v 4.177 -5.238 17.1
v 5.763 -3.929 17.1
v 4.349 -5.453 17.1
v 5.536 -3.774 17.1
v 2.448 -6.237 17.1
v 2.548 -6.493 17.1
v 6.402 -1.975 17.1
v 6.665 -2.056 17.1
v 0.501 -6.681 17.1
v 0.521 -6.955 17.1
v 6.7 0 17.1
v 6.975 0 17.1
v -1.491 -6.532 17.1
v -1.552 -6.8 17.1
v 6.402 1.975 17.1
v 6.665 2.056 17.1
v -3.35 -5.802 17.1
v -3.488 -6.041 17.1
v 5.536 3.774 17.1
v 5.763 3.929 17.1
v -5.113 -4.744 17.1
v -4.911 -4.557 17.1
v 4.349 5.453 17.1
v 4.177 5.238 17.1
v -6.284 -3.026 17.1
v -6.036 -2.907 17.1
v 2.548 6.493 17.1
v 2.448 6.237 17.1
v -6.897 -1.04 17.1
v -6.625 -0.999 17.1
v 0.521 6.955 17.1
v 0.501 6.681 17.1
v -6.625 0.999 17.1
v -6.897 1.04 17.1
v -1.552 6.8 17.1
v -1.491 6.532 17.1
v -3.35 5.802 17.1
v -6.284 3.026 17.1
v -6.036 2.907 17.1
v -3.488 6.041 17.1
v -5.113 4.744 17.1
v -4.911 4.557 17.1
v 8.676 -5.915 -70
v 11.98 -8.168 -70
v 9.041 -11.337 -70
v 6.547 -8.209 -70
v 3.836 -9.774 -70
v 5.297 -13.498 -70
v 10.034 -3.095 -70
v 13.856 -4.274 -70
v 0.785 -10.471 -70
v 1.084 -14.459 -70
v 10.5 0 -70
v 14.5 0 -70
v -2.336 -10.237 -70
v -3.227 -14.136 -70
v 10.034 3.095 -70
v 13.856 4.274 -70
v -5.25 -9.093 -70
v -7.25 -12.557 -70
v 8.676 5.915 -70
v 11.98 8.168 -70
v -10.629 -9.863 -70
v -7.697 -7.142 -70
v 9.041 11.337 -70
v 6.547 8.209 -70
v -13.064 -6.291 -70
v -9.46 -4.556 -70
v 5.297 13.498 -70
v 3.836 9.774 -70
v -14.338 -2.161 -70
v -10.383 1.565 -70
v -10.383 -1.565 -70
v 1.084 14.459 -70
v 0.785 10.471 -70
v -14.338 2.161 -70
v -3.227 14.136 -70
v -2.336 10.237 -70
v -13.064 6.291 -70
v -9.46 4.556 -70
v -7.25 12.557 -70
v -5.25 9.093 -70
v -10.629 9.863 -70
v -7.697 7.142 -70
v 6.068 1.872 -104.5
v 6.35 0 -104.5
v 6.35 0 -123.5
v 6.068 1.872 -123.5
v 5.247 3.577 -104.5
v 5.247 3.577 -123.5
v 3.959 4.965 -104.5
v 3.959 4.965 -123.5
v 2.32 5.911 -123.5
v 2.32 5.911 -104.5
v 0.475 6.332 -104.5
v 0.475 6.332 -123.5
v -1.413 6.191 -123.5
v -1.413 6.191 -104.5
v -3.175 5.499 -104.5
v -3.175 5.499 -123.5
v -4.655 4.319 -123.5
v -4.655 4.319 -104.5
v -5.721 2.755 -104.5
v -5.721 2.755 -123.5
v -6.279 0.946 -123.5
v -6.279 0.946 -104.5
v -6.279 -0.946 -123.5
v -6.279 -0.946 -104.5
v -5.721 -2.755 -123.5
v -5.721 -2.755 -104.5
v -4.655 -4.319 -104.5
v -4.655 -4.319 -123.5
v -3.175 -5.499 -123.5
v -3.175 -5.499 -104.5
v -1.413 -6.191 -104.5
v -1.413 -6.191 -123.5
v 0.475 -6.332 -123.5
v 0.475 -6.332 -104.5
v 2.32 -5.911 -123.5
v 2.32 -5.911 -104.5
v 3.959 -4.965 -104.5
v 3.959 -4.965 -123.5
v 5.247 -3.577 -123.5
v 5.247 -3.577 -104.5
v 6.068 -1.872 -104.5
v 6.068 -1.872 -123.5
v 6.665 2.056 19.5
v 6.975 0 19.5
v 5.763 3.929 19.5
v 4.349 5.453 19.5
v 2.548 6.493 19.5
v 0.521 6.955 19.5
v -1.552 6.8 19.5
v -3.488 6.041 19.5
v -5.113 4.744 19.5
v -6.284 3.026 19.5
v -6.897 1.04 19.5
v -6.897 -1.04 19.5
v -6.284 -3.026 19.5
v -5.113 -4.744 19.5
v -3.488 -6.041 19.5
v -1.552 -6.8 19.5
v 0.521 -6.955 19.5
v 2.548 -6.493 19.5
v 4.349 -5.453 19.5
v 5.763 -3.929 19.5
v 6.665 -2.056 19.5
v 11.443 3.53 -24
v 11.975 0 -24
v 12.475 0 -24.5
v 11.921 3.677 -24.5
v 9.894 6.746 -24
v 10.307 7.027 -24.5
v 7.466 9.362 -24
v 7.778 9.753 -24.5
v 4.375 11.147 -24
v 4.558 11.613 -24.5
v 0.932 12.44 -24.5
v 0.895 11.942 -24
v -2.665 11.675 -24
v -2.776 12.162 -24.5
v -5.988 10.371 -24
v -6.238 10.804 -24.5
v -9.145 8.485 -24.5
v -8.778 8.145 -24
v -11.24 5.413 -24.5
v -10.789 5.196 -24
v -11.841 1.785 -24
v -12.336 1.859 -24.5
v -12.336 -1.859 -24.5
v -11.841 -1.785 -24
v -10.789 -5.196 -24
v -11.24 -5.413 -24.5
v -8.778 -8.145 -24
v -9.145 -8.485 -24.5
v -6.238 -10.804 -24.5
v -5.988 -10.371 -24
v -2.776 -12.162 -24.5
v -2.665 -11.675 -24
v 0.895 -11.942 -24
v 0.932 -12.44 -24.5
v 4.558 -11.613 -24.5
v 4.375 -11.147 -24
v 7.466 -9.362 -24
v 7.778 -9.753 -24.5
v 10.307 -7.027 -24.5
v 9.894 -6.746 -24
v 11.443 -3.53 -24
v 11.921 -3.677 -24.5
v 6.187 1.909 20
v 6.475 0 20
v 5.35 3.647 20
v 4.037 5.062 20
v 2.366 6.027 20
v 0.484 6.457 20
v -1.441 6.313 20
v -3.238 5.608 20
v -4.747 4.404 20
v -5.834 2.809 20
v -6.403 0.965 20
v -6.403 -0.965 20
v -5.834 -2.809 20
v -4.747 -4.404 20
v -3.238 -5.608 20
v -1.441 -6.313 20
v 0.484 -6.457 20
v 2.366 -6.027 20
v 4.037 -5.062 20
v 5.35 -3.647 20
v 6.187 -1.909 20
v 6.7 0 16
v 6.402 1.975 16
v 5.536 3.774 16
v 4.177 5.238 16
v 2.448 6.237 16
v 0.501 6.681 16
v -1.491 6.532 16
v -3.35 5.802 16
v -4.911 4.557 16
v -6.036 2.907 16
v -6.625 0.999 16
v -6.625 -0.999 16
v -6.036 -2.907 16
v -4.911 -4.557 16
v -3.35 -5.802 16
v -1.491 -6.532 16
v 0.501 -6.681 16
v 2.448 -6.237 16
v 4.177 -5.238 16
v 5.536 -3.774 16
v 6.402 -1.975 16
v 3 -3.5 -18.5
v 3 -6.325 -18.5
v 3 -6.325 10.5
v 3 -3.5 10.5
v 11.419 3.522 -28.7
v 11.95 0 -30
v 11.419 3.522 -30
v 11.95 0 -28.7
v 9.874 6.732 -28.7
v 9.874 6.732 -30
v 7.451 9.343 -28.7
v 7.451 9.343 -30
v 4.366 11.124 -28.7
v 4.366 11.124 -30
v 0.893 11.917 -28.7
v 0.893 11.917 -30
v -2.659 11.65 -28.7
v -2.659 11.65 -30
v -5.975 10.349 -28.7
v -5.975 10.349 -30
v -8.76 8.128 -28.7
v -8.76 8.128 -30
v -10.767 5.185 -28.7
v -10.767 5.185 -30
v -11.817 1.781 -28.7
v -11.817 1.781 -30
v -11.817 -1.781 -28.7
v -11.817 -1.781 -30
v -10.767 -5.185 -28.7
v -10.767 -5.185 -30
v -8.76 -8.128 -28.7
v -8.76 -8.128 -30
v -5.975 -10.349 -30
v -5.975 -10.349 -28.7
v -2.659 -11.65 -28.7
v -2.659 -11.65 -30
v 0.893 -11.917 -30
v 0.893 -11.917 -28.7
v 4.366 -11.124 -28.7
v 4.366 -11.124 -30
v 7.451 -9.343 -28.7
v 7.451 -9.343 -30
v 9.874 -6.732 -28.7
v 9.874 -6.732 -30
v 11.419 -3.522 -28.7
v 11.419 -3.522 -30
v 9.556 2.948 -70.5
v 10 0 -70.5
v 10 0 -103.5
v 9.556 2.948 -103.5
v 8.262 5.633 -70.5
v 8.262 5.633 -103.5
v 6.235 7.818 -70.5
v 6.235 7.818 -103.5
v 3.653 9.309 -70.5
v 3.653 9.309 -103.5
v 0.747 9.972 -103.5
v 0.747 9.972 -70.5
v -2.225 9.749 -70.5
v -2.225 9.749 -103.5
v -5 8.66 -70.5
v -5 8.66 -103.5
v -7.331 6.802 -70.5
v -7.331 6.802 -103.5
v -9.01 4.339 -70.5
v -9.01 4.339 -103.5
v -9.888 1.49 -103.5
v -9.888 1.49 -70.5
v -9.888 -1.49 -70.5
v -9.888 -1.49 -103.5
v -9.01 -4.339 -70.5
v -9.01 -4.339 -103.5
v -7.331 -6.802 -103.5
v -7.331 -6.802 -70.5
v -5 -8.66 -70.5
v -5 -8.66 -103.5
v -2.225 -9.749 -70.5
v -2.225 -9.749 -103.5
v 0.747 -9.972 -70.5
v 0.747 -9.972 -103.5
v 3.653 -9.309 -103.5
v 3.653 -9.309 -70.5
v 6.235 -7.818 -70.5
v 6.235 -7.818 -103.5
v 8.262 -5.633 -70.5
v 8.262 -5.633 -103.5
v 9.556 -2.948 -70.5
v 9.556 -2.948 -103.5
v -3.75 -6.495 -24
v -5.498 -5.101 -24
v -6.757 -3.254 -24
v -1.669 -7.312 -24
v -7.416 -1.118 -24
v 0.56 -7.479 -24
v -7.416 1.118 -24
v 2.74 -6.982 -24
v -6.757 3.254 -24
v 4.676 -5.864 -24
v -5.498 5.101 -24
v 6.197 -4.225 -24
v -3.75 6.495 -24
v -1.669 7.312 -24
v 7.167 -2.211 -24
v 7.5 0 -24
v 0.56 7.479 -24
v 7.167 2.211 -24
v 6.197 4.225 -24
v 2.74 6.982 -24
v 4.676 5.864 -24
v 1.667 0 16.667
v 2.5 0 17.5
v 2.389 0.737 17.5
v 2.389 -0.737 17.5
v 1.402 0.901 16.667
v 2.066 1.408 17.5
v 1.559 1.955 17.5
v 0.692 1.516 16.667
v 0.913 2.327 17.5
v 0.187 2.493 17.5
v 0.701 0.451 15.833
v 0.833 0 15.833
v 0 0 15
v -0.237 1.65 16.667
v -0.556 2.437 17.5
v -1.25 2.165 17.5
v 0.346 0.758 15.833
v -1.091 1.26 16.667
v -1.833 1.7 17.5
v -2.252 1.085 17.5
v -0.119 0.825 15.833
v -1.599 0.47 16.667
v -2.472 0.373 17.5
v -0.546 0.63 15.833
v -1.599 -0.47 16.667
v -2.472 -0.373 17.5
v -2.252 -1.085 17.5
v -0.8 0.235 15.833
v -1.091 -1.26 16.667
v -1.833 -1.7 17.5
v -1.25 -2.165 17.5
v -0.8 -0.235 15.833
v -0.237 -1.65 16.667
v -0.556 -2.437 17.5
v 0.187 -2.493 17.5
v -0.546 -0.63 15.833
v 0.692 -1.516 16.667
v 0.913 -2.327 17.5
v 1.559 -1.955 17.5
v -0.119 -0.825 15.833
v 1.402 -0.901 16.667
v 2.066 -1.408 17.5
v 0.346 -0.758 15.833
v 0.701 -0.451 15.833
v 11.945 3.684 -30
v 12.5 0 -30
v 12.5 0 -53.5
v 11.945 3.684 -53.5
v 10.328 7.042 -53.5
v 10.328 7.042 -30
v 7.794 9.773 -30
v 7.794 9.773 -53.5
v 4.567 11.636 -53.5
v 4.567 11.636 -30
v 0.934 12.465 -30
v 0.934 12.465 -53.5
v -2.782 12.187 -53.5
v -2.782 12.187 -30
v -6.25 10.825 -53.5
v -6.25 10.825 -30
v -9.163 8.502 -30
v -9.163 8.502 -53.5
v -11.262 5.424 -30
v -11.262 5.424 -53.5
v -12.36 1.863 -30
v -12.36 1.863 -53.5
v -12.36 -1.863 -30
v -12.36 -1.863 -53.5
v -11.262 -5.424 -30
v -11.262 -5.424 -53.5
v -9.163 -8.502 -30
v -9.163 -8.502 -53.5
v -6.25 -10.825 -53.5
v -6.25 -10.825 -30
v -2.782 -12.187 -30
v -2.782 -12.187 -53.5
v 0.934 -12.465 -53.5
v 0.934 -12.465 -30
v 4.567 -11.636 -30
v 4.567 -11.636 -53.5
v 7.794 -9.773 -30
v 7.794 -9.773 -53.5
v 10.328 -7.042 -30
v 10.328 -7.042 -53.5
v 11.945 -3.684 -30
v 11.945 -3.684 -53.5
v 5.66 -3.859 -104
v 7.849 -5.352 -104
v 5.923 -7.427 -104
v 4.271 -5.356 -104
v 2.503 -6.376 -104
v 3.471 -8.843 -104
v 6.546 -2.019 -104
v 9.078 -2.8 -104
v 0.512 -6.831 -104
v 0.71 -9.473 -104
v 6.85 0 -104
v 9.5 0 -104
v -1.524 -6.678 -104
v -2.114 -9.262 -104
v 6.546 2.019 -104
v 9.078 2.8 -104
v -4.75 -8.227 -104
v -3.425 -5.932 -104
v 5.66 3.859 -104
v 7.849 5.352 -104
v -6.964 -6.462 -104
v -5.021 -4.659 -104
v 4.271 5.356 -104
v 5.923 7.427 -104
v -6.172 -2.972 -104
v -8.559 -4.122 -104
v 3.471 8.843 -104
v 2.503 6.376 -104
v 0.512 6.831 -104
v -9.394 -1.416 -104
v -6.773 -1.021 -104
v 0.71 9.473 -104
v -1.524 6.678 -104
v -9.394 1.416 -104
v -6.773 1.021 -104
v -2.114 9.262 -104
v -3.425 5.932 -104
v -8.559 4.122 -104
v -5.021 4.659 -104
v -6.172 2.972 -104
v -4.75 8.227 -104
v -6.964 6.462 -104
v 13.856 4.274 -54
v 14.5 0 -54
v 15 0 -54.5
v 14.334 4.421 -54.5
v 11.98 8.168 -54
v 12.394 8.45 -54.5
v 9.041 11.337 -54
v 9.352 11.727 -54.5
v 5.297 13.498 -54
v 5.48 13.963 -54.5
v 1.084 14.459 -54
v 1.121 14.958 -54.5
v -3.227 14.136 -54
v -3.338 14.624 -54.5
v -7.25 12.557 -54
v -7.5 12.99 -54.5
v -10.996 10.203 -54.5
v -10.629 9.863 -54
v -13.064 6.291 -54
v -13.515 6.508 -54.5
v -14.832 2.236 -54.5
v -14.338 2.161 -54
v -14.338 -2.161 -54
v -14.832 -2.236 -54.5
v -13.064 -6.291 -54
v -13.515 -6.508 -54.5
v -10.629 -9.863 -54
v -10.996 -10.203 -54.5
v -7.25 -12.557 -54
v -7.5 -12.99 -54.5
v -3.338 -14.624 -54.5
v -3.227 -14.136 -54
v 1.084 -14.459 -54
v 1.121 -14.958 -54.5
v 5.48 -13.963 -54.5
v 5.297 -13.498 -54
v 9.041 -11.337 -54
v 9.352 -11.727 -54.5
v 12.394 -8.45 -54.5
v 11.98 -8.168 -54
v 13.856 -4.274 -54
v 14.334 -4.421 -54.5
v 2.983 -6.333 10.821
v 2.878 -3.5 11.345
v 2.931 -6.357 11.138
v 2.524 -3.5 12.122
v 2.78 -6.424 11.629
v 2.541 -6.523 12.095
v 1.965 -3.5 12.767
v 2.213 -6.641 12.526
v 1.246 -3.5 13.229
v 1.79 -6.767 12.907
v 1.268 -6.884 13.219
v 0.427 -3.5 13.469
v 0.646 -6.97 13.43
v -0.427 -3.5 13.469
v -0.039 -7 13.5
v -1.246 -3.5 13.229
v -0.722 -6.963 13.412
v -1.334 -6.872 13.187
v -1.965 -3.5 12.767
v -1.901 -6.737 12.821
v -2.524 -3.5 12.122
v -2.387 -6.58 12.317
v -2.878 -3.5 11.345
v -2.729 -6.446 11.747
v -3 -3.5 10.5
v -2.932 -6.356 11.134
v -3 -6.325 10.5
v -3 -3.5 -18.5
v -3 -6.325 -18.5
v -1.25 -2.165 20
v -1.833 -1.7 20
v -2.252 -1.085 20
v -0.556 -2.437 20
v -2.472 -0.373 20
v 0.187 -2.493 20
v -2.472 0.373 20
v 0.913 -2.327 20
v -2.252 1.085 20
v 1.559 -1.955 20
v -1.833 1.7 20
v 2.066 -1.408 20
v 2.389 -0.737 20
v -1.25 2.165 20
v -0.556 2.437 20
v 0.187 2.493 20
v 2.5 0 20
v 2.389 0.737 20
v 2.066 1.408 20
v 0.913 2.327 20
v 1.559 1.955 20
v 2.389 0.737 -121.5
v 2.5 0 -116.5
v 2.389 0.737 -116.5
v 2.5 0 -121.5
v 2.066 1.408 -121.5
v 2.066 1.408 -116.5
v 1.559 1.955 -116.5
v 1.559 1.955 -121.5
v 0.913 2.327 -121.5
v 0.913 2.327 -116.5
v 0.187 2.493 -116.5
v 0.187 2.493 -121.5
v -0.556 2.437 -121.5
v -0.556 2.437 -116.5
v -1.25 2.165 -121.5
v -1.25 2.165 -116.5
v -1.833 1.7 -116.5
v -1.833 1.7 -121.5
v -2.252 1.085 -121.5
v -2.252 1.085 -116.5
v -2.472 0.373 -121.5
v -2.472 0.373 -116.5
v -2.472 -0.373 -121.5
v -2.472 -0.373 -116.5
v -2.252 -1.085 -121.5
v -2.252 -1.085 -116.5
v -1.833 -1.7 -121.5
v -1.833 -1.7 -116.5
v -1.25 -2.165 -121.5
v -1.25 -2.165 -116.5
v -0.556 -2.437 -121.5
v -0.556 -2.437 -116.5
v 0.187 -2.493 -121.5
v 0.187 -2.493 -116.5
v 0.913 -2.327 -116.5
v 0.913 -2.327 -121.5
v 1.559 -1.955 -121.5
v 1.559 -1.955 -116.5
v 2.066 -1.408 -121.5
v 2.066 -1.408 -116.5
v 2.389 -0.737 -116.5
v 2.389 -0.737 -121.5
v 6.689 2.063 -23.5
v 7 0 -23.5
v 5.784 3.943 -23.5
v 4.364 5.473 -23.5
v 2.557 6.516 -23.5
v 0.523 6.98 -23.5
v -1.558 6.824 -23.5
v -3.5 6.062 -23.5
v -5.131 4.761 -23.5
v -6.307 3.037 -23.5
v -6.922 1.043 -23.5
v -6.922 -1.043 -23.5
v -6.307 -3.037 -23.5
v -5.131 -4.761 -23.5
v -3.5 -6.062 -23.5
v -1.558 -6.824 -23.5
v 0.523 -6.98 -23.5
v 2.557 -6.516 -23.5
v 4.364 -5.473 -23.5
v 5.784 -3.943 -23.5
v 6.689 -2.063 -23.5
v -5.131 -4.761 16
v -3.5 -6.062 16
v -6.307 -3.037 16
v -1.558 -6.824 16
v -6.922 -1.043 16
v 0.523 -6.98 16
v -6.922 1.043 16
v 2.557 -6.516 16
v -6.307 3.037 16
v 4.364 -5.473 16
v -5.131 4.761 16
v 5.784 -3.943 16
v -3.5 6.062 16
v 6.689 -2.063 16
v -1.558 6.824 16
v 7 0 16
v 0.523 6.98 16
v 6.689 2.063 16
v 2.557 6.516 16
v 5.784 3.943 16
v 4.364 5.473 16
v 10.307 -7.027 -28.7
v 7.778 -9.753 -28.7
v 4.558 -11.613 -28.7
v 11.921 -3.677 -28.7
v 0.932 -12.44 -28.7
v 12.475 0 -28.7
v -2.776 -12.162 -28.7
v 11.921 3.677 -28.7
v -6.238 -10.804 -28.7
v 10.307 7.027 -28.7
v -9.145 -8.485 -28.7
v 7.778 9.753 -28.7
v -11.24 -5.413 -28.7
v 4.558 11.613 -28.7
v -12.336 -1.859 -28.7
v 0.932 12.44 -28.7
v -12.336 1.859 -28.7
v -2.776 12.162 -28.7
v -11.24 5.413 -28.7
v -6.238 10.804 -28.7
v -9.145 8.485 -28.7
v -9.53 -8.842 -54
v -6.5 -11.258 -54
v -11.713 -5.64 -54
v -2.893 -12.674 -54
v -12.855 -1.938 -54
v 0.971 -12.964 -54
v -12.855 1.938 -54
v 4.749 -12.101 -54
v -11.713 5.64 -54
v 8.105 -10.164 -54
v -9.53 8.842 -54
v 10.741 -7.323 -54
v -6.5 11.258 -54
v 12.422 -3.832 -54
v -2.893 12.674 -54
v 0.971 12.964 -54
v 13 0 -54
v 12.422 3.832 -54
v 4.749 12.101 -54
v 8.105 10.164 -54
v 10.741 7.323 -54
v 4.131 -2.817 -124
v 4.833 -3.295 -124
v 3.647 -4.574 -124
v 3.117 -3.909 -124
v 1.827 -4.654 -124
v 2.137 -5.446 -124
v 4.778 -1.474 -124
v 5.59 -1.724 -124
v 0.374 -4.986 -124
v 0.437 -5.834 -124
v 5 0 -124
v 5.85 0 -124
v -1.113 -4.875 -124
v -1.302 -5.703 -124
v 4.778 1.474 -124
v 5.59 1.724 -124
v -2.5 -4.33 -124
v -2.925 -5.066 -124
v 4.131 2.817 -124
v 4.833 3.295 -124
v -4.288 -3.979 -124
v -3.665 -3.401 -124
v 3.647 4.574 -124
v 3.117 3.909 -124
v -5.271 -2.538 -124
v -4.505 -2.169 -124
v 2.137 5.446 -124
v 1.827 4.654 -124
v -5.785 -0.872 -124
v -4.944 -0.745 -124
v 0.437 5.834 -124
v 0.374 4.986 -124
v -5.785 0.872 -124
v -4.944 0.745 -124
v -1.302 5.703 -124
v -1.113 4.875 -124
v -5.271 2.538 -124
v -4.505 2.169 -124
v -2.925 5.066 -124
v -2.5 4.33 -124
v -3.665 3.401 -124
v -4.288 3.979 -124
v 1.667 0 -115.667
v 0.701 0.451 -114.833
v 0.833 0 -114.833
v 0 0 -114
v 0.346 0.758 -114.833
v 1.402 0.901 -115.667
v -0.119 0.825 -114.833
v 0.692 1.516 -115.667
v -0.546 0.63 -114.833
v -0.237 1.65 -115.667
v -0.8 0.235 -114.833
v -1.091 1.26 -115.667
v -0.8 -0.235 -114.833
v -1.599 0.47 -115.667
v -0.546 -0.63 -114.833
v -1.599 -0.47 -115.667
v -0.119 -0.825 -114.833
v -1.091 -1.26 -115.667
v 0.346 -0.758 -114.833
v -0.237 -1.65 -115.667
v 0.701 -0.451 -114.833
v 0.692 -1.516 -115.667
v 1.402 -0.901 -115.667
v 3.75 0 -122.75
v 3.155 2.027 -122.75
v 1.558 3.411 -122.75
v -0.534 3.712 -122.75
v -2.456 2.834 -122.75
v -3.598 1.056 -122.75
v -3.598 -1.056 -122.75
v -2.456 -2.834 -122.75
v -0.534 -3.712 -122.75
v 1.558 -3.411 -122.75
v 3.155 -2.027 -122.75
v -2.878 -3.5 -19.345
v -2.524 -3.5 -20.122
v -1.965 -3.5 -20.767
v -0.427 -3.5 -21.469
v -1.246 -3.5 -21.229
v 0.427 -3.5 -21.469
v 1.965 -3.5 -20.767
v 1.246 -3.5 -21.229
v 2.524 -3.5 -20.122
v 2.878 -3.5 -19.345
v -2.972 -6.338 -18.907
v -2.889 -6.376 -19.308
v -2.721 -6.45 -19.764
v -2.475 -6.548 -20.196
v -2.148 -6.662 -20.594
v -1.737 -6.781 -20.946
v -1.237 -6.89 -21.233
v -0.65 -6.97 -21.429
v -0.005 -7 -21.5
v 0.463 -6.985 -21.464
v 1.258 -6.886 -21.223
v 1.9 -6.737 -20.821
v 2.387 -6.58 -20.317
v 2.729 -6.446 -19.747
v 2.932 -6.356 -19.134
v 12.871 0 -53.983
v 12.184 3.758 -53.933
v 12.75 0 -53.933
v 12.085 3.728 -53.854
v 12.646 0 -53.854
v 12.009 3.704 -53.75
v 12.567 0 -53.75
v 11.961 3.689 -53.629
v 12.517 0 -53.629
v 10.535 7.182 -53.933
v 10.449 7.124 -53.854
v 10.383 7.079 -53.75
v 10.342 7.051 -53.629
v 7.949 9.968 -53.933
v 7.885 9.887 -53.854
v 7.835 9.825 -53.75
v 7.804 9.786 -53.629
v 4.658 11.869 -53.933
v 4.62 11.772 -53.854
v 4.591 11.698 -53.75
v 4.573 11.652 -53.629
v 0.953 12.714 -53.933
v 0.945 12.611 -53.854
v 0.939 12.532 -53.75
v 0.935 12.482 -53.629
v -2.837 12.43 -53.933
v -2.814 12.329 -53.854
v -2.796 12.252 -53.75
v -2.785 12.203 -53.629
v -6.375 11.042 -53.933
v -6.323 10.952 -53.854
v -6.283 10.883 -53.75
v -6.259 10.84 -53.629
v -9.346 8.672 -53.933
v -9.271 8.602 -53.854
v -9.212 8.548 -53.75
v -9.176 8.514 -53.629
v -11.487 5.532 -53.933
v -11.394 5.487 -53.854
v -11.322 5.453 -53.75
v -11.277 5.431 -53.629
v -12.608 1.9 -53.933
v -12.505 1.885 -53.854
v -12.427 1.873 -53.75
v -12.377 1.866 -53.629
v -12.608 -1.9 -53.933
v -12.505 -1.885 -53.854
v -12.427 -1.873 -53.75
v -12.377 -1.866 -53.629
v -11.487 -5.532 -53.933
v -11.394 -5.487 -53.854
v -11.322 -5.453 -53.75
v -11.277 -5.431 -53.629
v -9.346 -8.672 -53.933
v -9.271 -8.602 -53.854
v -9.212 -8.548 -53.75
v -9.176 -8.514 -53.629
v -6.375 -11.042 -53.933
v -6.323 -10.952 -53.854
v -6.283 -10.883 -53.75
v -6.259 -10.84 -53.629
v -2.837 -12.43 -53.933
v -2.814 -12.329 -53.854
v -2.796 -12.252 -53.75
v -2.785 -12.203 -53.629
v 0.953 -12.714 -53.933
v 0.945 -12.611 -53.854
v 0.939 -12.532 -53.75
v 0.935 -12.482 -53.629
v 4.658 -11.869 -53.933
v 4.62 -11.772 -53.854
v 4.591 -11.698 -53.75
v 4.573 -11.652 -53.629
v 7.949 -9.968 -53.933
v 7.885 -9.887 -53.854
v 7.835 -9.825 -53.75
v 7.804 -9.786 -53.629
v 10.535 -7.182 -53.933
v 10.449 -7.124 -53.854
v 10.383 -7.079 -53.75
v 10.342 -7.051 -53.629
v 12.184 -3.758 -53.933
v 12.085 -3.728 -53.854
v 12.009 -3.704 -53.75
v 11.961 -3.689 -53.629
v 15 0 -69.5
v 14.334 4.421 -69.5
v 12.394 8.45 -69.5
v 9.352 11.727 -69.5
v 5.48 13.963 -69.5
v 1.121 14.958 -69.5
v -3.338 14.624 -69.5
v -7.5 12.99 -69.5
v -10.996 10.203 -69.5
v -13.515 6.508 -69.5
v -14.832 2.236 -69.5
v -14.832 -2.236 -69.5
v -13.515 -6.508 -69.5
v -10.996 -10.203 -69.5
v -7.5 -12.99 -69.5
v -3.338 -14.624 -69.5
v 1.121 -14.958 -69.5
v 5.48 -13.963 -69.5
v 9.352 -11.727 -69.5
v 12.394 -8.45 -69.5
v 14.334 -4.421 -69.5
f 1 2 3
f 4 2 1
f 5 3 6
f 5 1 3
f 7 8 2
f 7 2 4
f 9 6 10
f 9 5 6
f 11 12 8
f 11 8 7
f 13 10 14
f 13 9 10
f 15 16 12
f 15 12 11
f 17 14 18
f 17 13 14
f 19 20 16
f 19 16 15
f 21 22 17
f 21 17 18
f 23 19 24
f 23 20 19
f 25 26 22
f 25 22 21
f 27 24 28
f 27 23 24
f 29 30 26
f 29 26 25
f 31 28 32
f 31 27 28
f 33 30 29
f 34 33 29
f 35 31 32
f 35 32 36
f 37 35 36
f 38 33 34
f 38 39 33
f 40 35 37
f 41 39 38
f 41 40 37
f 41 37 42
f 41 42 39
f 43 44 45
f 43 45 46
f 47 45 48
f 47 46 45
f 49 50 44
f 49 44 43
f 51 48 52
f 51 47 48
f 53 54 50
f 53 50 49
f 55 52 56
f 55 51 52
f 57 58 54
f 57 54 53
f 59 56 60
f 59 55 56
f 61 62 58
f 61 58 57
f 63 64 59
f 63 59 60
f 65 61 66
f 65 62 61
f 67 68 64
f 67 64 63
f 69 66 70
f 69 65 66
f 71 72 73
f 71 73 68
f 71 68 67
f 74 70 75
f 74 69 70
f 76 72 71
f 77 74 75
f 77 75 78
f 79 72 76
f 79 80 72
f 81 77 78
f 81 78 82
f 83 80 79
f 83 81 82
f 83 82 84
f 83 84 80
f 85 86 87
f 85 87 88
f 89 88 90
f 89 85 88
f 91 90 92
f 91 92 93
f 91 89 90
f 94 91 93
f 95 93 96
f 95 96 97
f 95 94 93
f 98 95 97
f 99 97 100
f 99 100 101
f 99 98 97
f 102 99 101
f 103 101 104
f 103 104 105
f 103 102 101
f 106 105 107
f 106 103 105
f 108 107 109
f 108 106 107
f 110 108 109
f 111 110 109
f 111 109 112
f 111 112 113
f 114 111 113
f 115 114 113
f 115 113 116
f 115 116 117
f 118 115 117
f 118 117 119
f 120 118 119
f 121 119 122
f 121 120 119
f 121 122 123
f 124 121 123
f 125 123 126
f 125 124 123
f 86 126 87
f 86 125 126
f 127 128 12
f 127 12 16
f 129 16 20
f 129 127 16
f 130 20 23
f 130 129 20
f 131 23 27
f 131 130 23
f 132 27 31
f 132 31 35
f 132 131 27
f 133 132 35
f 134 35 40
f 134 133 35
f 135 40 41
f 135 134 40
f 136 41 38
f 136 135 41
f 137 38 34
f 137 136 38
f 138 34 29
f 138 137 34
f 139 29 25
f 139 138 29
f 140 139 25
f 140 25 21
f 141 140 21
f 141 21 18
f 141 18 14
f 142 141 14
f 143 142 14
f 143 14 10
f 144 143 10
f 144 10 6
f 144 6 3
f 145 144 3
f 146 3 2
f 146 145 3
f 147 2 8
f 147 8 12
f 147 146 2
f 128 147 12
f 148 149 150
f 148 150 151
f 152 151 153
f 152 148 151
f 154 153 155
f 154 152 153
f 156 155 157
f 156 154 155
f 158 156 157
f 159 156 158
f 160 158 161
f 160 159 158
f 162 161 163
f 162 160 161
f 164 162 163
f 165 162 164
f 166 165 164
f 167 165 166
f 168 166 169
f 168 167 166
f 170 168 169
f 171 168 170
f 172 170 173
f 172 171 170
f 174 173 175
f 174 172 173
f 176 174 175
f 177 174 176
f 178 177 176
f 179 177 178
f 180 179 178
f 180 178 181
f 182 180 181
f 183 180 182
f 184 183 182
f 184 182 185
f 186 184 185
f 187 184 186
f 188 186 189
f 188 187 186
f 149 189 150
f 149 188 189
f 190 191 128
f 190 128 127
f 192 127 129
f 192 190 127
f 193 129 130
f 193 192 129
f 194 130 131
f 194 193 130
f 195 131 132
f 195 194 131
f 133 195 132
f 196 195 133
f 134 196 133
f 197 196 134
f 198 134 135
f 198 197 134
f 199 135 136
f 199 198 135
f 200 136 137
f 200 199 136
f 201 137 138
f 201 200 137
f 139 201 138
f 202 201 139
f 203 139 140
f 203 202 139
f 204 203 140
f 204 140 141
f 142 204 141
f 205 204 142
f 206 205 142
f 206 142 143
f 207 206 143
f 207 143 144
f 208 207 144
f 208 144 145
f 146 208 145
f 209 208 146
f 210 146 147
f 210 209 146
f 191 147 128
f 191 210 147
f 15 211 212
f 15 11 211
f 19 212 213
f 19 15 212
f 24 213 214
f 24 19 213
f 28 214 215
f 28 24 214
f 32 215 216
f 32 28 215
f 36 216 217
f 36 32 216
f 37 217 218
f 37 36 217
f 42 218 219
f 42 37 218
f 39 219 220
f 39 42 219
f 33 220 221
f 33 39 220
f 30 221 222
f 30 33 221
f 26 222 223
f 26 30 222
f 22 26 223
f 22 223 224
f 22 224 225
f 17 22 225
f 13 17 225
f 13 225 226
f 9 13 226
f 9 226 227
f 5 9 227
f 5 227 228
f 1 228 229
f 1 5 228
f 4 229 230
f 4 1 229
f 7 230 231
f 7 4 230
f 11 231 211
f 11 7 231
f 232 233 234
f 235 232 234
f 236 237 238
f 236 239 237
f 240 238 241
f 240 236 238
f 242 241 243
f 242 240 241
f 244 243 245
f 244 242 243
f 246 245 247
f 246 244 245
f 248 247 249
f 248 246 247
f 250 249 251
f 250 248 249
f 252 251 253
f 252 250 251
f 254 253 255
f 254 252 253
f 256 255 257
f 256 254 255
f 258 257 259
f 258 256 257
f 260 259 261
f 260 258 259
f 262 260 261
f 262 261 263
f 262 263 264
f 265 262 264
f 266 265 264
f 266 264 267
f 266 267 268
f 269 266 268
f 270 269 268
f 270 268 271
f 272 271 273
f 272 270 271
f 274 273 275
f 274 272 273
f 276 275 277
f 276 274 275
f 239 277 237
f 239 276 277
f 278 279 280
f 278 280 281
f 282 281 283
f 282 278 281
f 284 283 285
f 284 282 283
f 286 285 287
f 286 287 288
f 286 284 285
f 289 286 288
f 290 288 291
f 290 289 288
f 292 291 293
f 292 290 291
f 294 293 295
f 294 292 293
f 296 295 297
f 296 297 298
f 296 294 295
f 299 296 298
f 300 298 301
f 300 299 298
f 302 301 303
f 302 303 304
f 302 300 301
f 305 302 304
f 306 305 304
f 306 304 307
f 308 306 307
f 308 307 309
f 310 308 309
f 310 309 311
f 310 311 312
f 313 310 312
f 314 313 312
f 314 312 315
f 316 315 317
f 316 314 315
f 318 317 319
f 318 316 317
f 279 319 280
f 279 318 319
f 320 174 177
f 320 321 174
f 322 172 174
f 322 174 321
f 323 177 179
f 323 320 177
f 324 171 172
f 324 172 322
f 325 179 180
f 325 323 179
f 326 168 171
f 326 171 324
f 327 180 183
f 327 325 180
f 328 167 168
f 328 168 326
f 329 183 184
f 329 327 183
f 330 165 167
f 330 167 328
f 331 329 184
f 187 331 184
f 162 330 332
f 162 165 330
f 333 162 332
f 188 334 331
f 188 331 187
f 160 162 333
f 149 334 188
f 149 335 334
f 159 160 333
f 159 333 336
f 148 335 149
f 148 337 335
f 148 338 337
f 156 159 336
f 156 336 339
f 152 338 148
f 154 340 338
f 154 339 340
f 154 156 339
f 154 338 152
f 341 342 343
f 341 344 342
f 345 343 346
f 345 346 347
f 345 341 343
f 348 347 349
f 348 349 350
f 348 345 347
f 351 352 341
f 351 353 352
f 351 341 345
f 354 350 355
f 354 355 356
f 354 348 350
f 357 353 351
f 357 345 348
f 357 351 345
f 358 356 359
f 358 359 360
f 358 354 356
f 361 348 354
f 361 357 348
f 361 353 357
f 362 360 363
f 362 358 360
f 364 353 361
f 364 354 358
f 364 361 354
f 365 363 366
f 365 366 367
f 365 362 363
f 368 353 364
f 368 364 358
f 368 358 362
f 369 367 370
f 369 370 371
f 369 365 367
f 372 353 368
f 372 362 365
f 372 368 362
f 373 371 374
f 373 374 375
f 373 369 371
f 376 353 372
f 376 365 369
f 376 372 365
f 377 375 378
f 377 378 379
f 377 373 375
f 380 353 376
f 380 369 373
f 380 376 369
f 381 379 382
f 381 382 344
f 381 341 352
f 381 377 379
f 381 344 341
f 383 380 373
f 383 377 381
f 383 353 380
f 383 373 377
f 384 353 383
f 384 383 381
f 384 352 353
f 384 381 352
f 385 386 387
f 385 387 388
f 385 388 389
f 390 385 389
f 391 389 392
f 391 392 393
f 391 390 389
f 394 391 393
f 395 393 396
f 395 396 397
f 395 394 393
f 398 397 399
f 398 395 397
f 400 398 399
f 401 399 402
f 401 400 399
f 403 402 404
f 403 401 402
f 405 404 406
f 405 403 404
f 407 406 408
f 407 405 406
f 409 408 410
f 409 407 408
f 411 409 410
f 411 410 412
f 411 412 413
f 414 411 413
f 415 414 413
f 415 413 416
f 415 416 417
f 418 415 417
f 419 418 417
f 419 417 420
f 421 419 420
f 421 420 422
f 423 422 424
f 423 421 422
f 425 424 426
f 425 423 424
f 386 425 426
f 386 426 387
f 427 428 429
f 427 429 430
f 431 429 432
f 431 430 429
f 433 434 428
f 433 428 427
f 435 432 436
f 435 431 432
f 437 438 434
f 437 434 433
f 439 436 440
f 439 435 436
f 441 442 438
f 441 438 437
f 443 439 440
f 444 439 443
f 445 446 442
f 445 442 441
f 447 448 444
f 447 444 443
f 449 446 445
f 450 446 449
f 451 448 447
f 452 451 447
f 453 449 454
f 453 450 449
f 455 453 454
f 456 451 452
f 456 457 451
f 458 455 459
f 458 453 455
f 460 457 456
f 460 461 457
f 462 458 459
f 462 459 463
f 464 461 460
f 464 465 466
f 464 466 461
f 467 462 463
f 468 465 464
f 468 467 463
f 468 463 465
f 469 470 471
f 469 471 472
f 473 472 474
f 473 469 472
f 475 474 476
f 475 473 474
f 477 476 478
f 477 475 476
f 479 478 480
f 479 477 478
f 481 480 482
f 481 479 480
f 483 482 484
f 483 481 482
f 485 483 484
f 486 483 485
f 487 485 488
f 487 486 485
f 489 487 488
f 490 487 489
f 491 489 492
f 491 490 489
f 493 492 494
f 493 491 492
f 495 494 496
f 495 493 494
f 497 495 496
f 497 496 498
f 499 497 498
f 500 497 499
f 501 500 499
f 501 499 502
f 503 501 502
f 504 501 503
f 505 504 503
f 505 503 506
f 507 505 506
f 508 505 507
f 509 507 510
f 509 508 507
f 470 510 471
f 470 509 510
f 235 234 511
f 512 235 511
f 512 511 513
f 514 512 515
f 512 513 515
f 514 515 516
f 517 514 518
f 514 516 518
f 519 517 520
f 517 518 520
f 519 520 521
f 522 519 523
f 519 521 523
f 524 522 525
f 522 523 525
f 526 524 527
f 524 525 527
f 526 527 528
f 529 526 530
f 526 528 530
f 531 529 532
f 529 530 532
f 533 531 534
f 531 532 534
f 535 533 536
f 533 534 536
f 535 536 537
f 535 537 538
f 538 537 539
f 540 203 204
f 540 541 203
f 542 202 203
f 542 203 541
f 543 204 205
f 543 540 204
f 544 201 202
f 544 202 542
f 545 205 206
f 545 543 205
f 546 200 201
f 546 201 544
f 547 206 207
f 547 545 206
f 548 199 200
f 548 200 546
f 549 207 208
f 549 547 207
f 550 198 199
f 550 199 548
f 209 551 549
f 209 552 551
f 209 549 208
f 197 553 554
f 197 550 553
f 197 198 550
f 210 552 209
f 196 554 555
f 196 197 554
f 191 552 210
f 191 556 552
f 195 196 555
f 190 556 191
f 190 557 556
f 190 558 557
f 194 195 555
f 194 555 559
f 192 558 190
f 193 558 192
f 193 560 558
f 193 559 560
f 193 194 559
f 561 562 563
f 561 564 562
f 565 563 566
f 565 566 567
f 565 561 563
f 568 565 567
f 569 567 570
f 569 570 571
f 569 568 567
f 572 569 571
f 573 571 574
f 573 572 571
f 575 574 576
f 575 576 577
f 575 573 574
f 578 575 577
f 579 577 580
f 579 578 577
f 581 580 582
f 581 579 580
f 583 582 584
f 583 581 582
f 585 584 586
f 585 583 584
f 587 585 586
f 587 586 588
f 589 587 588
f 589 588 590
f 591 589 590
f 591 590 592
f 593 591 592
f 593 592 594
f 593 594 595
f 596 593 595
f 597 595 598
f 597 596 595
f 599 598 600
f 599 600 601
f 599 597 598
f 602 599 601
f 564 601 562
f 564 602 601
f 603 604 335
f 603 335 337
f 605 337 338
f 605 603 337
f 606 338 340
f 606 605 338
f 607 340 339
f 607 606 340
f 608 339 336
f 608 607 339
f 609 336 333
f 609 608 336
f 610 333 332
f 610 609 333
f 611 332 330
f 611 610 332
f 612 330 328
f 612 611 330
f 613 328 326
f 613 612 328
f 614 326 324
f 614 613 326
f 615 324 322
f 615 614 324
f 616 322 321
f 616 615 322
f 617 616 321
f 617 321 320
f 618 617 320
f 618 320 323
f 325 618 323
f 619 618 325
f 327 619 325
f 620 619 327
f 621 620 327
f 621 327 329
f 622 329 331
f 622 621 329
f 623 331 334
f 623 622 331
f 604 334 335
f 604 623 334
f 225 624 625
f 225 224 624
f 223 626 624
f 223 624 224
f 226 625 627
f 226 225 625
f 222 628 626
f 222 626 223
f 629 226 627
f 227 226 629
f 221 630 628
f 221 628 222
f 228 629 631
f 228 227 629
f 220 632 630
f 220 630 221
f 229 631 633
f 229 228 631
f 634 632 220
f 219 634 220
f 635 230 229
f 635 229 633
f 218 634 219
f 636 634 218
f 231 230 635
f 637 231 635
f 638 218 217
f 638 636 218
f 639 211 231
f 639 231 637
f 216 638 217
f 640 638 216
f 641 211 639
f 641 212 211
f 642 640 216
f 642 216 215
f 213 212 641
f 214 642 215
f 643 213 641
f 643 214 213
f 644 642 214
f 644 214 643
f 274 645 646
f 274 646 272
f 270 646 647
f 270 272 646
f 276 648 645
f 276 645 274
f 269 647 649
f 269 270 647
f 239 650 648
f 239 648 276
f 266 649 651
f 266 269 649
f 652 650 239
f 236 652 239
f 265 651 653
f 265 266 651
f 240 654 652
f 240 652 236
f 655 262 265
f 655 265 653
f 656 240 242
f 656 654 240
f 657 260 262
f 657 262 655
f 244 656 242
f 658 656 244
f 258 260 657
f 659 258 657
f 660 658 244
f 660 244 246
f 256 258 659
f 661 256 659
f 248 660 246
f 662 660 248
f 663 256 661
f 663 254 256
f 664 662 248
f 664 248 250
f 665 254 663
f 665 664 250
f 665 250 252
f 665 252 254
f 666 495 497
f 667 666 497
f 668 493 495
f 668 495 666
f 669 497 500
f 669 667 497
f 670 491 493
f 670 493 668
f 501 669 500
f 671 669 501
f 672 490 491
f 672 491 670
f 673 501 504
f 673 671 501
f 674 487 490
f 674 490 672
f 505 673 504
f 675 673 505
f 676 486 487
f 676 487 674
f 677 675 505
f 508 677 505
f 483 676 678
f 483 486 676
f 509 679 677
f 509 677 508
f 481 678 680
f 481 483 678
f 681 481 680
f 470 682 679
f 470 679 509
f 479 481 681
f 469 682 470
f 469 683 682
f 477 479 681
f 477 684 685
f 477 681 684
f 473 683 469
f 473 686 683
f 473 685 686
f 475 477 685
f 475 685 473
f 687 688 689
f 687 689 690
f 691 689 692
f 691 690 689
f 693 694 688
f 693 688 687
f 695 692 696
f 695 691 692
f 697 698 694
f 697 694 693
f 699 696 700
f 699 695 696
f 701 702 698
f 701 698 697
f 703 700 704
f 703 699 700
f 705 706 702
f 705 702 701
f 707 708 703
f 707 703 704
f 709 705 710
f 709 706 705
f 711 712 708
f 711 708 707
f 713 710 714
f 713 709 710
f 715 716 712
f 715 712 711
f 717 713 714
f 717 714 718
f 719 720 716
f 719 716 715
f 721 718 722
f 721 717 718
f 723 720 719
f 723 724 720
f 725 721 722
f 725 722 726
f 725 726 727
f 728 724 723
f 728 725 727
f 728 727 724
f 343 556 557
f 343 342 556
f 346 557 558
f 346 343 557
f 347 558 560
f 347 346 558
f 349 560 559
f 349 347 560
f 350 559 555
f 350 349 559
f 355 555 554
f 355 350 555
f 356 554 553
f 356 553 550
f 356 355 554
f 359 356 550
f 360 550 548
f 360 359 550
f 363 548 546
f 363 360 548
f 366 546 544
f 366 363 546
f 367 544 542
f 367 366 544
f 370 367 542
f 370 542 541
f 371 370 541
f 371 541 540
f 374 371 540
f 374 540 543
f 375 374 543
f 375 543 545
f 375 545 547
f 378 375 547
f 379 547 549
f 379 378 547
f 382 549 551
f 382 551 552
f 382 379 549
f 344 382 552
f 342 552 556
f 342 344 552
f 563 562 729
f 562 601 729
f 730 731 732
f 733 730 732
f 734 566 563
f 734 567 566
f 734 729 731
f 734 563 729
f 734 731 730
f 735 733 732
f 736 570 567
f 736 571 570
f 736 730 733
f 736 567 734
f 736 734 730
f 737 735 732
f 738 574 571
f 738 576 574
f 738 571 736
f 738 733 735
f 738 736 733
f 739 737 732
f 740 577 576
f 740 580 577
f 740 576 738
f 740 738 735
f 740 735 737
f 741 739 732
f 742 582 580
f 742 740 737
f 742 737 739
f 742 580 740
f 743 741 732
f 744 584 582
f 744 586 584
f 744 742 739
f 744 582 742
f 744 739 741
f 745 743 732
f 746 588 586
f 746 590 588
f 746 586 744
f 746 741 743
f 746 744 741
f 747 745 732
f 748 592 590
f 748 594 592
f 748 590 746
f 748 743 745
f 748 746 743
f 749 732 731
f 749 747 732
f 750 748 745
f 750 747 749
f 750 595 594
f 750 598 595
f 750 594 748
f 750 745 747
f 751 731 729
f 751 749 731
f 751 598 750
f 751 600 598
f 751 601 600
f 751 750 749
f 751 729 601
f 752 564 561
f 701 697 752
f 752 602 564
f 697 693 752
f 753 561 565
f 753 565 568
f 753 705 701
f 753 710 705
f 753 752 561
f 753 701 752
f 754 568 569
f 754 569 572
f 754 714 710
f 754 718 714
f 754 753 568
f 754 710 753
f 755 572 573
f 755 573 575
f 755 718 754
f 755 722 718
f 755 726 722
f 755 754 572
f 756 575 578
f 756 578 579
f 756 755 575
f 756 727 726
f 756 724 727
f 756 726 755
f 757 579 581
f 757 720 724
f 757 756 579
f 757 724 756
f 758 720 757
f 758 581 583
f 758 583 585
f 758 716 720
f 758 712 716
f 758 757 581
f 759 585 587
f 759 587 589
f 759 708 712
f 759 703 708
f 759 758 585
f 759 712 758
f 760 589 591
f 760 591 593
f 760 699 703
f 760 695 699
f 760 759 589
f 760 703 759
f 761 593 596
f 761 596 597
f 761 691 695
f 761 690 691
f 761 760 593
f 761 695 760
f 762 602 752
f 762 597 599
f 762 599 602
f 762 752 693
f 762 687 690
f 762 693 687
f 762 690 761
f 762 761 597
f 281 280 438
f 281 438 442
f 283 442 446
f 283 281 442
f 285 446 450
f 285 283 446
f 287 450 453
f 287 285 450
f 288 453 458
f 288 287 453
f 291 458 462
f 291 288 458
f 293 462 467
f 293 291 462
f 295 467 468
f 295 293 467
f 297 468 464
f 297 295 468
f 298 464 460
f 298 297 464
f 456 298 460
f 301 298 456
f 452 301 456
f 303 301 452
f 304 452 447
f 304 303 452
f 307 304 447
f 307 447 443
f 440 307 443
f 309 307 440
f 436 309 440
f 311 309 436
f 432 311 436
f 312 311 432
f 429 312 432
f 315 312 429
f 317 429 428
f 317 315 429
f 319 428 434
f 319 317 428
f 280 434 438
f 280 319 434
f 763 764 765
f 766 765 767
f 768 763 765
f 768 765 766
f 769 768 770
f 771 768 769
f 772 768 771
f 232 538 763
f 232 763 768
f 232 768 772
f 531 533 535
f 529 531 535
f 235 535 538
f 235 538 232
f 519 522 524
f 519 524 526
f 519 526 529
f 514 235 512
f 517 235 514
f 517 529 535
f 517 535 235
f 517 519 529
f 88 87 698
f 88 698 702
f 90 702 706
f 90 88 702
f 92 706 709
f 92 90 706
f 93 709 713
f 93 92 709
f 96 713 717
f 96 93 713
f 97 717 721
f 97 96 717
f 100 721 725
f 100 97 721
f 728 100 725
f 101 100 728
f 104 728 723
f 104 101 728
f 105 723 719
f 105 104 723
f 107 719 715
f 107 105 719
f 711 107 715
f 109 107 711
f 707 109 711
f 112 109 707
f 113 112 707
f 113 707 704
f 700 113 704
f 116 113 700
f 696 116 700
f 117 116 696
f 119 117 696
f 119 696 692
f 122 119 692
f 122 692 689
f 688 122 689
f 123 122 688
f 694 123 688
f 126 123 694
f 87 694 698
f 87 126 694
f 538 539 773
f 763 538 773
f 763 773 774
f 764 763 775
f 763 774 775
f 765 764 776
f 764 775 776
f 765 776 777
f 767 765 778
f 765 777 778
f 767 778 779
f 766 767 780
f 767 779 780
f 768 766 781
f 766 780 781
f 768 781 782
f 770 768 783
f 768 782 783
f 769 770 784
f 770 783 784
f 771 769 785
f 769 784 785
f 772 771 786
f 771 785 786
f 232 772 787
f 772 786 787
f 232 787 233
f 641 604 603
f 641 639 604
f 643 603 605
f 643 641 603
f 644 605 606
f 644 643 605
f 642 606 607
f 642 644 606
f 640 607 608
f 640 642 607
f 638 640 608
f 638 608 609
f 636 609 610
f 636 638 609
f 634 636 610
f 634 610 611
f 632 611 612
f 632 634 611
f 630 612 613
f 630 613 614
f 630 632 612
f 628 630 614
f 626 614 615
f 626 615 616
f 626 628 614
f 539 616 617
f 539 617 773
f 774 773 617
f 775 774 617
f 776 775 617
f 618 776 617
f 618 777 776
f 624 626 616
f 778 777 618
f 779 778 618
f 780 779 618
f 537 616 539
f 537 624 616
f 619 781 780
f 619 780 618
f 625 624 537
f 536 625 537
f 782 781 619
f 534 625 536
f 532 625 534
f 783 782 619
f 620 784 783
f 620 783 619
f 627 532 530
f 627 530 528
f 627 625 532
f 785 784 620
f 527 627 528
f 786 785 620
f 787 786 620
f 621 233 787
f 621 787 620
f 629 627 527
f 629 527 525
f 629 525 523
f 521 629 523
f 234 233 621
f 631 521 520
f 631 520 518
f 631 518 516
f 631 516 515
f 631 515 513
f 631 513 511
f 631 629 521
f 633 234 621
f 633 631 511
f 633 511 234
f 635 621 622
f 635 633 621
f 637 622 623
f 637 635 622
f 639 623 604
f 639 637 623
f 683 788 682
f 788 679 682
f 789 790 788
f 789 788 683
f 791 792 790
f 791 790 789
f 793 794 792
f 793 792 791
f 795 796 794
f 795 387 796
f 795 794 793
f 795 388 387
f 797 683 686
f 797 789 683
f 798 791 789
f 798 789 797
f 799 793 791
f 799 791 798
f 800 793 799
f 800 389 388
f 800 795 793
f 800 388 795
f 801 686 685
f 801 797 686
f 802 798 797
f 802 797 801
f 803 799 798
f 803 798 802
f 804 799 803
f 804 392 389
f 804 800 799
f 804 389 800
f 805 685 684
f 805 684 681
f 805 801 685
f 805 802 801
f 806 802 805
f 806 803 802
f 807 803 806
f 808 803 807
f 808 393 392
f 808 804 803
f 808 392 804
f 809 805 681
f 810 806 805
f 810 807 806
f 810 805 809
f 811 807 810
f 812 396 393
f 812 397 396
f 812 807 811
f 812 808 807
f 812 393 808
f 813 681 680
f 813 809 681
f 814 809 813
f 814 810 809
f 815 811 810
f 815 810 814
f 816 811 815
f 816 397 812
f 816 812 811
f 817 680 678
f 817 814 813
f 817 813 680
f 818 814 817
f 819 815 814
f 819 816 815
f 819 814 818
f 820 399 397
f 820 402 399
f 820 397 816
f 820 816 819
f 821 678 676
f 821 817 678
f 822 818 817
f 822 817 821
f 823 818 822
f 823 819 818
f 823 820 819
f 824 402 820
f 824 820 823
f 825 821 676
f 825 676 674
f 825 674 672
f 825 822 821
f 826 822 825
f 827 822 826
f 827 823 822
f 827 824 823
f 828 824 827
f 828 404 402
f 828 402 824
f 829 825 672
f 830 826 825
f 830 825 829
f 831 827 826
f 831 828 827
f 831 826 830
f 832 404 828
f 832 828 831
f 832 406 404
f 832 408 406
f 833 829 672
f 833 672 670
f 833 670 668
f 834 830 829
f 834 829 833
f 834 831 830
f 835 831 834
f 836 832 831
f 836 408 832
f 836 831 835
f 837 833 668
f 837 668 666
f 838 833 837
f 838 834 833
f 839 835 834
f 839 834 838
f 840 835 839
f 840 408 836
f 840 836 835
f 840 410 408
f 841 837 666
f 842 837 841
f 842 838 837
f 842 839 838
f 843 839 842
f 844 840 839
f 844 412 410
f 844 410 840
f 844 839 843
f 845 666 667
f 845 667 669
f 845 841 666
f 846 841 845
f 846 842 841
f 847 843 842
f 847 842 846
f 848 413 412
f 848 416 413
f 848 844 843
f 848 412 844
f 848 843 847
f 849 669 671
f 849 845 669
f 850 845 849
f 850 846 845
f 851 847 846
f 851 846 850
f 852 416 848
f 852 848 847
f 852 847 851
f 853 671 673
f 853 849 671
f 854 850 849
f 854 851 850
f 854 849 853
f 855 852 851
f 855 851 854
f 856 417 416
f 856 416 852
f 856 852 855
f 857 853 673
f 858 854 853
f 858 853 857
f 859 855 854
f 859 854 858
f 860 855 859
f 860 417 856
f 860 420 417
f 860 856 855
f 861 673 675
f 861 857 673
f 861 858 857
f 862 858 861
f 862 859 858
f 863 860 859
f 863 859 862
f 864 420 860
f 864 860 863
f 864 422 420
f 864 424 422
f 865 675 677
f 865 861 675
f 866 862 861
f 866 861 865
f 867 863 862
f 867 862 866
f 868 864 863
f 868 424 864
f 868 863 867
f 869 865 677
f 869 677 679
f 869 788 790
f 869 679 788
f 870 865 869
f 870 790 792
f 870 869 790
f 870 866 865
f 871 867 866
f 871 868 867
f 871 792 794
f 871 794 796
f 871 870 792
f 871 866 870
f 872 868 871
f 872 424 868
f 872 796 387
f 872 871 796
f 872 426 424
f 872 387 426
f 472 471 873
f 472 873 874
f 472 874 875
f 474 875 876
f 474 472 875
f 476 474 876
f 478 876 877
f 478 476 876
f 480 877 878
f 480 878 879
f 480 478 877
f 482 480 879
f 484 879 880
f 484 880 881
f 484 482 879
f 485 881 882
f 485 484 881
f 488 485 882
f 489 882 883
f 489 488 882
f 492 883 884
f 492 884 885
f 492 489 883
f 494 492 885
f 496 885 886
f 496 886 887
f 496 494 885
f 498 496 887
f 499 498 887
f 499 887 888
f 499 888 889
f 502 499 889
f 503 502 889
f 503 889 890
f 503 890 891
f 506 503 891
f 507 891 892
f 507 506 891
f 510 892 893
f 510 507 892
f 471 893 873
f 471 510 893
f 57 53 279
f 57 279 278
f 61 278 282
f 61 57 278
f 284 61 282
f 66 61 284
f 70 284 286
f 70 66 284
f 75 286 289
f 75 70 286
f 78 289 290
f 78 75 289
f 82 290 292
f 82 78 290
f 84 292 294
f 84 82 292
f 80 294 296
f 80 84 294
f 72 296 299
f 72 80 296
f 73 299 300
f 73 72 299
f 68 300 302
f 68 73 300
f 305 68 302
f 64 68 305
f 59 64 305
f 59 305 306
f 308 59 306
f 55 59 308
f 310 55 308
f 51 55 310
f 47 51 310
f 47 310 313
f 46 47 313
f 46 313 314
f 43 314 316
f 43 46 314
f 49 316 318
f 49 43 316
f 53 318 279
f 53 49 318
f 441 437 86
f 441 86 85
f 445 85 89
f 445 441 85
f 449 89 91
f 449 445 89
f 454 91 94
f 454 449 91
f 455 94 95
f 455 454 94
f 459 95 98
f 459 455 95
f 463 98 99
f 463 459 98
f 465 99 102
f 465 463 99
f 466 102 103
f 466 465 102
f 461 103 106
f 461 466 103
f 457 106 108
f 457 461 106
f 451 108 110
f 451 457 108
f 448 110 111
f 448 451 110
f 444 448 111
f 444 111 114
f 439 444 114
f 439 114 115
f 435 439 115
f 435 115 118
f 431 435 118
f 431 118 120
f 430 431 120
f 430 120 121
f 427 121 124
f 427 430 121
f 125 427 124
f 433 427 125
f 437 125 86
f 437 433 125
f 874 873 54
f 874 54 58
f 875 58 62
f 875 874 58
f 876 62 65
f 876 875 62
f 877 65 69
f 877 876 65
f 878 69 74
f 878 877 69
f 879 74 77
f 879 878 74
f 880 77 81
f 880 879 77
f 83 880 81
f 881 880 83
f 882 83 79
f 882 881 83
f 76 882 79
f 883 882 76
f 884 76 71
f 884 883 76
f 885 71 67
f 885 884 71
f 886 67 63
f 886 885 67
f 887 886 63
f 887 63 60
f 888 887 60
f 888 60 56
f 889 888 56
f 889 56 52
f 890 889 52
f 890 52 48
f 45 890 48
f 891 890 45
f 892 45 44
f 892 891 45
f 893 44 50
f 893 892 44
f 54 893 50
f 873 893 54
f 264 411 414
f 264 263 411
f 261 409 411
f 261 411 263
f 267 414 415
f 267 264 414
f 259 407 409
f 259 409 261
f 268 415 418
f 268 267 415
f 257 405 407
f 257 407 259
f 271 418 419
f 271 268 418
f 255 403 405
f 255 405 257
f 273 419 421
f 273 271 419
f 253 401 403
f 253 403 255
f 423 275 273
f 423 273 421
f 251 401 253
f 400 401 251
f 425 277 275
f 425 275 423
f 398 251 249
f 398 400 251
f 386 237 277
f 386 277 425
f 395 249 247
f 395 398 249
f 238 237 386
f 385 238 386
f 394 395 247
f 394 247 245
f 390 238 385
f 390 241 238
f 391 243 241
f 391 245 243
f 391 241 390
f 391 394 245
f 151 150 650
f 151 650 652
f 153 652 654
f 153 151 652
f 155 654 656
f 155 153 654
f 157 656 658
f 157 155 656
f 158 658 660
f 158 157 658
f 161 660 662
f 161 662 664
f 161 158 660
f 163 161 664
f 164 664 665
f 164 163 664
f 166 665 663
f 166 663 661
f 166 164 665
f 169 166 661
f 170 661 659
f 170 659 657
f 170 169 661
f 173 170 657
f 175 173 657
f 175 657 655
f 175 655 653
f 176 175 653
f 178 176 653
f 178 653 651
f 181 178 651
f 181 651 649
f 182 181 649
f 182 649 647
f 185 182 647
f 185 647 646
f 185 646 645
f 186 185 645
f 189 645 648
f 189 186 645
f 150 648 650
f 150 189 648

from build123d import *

# Parameters (mm, degrees)
F2_SIZE  = 0.5
F3_R     = 0.5
F6_DEPTH = 3.5


with BuildPart() as f1:
    # F0 (on Front) → F1 (revolve)
    with BuildSketch(Plane.XZ):
        Polygon((0, 15), (0, 0), (0, -114), (2.5, -116.5), (2.5, -121.5), (5, -124), (6.35, -124), (6.35, -104), (10, -104), (10, -70), (15, -70), (15, -54), (12.5, -54), (12.5, -30), (11.95, -30), (11.95, -28.7), (12.475, -28.7), (12.475, -24), (7, -24), (7, 16), (6.7, 16), (6.7, 17.1), (6.975, 17.1), (6.975, 20), (2.5, 20), (2.5, 17.5), align=None)
    revolve(axis=Axis((0, 0, 55.465363), (0, 0, 1)))

    # F2
    f2_edges = [f1.edges().sort_by_distance(p)[0] for p in [
        (-6.975, 0, 20),
        (-12.475, 0, -24),
        (-7, 0, -24),
        (-6.35, 0, -104),
        (-10, 0, -104),
        (-6.35, 0, -124),
        (-15, 0, -54),
        (-10, 0, -70),
        (-15, 0, -70),
    ]]
    chamfer(f2_edges, length=F2_SIZE)

    # F3
    f3_edges = [f1.edges().sort_by_distance(p)[0] for p in [
        (-12.5, 0, -54),
    ]]
    fillet(f3_edges, radius=F3_R)

    # F5 (on offset) → F6 (cut)
    with BuildSketch(Plane.XZ.offset(7)):
        with BuildLine():
            Line((3, -18.5), (3, 10.5))
            ThreePointArc((3, 10.5), (0, 13.5), (-3, 10.5))
            Line((-3, 10.5), (-3, -18.5))
            ThreePointArc((-3, -18.5), (0, -21.5), (3, -18.5))
        make_face()
    extrude(amount=-F6_DEPTH, mode=Mode.SUBTRACT)


solid = f1.part
